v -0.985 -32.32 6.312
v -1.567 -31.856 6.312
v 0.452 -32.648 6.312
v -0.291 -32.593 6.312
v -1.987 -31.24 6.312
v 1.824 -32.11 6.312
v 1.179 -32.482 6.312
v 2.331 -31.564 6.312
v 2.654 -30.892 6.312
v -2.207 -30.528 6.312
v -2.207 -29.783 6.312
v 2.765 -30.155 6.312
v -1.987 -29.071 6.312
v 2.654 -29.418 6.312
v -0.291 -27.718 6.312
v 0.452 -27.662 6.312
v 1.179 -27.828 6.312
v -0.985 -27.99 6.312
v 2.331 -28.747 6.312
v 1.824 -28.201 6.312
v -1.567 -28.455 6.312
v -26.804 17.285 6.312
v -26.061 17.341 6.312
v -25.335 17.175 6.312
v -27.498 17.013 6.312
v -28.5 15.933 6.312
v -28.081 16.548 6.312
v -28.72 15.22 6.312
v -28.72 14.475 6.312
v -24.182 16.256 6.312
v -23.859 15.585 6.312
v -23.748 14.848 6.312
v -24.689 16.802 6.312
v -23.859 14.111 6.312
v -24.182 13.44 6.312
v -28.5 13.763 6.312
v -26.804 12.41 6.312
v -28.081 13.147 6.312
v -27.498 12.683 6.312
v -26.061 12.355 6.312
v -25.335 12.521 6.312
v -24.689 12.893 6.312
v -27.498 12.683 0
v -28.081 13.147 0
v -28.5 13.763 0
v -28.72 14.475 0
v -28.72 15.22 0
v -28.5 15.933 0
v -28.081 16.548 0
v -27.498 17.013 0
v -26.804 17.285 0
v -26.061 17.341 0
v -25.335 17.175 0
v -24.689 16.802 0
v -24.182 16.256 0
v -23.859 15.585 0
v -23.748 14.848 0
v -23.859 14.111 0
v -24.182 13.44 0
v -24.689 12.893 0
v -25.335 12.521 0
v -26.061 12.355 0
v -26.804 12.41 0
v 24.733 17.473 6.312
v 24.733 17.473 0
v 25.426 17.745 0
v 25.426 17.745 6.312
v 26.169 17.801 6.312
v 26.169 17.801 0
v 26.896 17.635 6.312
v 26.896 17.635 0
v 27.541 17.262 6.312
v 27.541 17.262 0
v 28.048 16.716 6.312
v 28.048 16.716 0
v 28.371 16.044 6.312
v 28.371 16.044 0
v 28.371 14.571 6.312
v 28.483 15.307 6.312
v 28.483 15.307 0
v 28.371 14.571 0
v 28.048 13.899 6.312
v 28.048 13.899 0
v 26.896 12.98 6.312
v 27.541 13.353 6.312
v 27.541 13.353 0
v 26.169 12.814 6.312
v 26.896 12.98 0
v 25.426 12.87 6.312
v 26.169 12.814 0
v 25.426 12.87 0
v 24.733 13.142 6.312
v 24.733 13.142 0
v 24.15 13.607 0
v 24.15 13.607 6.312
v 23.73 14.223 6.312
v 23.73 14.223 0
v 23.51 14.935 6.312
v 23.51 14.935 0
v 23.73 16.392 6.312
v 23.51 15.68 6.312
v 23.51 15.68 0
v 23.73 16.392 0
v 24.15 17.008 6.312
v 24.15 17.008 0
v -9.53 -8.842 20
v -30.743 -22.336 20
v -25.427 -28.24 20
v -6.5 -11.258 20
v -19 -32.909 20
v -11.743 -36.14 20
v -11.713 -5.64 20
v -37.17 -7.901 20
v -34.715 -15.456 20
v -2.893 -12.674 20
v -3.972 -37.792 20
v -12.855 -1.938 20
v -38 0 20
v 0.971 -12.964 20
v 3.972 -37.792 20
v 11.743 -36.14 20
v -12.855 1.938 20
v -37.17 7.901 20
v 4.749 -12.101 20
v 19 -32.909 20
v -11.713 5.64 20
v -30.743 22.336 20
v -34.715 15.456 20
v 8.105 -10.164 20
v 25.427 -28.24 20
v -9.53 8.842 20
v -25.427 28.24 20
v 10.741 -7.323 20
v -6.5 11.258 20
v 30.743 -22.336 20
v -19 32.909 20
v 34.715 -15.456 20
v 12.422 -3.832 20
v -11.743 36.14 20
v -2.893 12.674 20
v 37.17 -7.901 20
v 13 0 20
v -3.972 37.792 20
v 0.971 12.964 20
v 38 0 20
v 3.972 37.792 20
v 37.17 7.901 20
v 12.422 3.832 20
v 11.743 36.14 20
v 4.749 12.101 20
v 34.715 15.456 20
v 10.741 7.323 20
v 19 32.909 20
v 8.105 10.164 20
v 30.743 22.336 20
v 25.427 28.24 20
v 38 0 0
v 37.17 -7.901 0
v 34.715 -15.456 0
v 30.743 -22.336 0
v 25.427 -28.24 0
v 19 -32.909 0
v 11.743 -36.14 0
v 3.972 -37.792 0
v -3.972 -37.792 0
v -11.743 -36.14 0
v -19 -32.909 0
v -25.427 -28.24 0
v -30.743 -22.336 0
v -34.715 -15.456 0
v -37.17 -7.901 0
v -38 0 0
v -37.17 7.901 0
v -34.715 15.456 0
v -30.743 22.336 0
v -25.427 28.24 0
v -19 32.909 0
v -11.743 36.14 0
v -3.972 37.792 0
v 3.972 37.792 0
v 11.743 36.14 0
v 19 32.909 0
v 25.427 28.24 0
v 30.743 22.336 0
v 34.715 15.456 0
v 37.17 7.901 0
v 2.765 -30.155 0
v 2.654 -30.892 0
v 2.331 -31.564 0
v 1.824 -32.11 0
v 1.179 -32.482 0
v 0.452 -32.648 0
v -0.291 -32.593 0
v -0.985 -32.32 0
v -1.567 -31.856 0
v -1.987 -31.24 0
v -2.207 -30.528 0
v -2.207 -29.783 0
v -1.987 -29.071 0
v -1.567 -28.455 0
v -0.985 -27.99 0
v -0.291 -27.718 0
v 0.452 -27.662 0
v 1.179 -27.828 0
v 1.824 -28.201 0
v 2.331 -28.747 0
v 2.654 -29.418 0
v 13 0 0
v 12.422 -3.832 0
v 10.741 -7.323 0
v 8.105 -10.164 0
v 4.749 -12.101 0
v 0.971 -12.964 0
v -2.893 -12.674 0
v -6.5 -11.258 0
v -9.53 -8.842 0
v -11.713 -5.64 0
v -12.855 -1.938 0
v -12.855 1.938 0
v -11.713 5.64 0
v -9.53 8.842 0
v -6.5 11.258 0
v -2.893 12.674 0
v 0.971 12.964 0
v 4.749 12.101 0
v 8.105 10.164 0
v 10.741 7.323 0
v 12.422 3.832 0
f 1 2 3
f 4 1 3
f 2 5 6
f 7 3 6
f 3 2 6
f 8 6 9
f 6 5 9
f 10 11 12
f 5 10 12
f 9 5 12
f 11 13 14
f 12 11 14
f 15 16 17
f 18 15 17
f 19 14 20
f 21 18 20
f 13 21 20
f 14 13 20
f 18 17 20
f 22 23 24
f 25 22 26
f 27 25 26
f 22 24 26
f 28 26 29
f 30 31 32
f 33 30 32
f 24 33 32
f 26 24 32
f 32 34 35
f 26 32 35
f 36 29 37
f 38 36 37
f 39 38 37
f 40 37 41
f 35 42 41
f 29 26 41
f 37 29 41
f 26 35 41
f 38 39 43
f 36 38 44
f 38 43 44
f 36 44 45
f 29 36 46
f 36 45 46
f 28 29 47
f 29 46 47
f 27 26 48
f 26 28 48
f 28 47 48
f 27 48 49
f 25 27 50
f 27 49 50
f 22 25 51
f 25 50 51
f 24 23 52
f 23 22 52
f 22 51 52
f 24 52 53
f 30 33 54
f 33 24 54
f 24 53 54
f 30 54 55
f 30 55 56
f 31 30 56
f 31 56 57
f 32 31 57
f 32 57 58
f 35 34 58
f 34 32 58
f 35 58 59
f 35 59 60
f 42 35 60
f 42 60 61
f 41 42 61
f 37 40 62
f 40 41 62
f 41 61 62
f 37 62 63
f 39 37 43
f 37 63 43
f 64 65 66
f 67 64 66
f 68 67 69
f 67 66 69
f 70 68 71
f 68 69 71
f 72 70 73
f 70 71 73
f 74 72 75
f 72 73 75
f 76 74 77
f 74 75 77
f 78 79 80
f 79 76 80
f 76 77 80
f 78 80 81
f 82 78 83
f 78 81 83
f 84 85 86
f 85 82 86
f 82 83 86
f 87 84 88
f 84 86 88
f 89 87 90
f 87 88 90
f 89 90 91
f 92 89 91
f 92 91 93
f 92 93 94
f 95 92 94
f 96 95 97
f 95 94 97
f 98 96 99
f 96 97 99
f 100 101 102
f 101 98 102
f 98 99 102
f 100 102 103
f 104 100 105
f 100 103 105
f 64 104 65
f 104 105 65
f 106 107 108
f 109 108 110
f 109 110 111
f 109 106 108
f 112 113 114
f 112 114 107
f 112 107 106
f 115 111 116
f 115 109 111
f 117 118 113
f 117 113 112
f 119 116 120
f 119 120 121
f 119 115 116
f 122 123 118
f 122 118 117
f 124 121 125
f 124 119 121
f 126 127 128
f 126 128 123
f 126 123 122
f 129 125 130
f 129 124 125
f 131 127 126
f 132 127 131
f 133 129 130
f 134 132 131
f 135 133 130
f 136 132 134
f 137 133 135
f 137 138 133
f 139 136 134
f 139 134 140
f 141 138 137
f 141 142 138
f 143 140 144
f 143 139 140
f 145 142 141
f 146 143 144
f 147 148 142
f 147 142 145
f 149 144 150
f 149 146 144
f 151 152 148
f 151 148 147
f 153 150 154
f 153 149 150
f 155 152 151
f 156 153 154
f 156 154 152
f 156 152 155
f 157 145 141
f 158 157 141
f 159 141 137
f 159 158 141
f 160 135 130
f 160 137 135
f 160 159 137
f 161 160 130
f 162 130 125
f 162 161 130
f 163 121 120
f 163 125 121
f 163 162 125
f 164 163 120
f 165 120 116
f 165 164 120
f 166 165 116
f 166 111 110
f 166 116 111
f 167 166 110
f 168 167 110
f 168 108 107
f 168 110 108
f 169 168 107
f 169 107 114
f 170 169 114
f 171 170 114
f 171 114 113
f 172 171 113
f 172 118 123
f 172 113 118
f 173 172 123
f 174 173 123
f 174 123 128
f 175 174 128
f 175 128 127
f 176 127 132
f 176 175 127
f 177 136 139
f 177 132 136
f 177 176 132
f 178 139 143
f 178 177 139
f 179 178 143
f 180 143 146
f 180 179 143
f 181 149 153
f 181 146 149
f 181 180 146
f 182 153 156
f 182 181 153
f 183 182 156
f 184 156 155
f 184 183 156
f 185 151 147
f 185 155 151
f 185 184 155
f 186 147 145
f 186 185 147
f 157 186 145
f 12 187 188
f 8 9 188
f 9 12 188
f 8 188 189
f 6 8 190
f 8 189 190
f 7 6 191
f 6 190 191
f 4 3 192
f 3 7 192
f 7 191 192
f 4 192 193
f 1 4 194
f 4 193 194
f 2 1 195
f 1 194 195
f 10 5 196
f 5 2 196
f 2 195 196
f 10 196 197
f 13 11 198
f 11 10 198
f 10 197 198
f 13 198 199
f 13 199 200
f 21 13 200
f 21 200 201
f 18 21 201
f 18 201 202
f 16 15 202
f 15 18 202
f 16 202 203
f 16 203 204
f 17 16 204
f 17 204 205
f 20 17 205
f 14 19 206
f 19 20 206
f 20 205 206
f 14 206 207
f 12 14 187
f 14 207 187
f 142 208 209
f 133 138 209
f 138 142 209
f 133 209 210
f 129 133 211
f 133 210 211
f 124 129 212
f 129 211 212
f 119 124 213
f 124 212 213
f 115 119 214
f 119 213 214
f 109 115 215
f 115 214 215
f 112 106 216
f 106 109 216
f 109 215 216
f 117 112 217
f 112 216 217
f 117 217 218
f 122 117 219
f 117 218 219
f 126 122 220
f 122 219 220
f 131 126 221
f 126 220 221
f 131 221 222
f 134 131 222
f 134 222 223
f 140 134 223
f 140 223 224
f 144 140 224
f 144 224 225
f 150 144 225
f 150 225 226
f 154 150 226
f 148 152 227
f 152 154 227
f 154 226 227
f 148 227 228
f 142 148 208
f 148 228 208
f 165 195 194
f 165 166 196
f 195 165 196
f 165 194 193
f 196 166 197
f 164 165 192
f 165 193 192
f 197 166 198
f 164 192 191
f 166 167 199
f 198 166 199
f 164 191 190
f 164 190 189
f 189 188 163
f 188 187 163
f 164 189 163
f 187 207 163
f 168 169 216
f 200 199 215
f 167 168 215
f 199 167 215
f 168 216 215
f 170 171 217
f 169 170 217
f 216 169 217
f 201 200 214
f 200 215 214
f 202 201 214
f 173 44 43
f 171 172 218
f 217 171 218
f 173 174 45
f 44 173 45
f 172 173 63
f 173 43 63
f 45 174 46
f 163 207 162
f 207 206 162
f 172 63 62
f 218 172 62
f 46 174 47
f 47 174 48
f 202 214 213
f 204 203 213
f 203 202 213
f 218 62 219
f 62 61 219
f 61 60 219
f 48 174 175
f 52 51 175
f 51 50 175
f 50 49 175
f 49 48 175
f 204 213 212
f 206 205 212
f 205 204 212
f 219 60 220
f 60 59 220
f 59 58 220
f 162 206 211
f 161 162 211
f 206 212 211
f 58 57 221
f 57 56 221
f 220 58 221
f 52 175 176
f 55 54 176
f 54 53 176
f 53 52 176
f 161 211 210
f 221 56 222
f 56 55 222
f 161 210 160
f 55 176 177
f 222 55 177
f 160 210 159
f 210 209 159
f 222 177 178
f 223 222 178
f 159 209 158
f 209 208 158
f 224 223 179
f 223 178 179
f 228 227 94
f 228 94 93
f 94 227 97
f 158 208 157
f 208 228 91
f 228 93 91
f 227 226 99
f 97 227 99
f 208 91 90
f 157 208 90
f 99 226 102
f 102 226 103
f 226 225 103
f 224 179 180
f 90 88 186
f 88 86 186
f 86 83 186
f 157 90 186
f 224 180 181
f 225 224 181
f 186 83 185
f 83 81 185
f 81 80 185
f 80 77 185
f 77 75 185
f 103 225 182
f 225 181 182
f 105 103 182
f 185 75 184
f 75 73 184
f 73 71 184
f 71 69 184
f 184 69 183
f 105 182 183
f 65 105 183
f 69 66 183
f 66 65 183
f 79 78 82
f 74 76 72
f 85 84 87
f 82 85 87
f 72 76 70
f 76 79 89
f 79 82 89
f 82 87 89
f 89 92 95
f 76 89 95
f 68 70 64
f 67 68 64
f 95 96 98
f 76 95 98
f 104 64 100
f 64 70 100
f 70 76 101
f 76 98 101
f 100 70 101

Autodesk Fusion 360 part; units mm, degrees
sketch "Sketch1" plane through (0, 0, 0) normal (0, 0, 1) x (1, 0, 0)
  circle A0 centre (0, 0) radius 13
  circle A1 centre (0, 0) radius 22.5
  circle A2 centre (0, 0) radius 38
  dimension "d1" = 45
  dimension "d2" = 26
  dimension "d3" = 76
extrude "Extrude1" add sketch "Sketch1" along normal blind 20 contours A1
sketch "Sketch2" plane through (0, 0, 0) normal (0, 0, 1) x (1, 0, 0)
  circle A0 centre (0.2654, -30.1553) radius 2.5
  dimension "d8" = 5
extrude "Extrude4" add sketch "Sketch1" along normal blind 20 contours A1 | A2
extrude "Extrude5" cut sketch "Sketch2" along normal blind 6.312
pattern_circular "C-Pattern2" count 3 over 360 about axis through (0, 0, 20) along (0, 0, 1) of "Extrude5"
